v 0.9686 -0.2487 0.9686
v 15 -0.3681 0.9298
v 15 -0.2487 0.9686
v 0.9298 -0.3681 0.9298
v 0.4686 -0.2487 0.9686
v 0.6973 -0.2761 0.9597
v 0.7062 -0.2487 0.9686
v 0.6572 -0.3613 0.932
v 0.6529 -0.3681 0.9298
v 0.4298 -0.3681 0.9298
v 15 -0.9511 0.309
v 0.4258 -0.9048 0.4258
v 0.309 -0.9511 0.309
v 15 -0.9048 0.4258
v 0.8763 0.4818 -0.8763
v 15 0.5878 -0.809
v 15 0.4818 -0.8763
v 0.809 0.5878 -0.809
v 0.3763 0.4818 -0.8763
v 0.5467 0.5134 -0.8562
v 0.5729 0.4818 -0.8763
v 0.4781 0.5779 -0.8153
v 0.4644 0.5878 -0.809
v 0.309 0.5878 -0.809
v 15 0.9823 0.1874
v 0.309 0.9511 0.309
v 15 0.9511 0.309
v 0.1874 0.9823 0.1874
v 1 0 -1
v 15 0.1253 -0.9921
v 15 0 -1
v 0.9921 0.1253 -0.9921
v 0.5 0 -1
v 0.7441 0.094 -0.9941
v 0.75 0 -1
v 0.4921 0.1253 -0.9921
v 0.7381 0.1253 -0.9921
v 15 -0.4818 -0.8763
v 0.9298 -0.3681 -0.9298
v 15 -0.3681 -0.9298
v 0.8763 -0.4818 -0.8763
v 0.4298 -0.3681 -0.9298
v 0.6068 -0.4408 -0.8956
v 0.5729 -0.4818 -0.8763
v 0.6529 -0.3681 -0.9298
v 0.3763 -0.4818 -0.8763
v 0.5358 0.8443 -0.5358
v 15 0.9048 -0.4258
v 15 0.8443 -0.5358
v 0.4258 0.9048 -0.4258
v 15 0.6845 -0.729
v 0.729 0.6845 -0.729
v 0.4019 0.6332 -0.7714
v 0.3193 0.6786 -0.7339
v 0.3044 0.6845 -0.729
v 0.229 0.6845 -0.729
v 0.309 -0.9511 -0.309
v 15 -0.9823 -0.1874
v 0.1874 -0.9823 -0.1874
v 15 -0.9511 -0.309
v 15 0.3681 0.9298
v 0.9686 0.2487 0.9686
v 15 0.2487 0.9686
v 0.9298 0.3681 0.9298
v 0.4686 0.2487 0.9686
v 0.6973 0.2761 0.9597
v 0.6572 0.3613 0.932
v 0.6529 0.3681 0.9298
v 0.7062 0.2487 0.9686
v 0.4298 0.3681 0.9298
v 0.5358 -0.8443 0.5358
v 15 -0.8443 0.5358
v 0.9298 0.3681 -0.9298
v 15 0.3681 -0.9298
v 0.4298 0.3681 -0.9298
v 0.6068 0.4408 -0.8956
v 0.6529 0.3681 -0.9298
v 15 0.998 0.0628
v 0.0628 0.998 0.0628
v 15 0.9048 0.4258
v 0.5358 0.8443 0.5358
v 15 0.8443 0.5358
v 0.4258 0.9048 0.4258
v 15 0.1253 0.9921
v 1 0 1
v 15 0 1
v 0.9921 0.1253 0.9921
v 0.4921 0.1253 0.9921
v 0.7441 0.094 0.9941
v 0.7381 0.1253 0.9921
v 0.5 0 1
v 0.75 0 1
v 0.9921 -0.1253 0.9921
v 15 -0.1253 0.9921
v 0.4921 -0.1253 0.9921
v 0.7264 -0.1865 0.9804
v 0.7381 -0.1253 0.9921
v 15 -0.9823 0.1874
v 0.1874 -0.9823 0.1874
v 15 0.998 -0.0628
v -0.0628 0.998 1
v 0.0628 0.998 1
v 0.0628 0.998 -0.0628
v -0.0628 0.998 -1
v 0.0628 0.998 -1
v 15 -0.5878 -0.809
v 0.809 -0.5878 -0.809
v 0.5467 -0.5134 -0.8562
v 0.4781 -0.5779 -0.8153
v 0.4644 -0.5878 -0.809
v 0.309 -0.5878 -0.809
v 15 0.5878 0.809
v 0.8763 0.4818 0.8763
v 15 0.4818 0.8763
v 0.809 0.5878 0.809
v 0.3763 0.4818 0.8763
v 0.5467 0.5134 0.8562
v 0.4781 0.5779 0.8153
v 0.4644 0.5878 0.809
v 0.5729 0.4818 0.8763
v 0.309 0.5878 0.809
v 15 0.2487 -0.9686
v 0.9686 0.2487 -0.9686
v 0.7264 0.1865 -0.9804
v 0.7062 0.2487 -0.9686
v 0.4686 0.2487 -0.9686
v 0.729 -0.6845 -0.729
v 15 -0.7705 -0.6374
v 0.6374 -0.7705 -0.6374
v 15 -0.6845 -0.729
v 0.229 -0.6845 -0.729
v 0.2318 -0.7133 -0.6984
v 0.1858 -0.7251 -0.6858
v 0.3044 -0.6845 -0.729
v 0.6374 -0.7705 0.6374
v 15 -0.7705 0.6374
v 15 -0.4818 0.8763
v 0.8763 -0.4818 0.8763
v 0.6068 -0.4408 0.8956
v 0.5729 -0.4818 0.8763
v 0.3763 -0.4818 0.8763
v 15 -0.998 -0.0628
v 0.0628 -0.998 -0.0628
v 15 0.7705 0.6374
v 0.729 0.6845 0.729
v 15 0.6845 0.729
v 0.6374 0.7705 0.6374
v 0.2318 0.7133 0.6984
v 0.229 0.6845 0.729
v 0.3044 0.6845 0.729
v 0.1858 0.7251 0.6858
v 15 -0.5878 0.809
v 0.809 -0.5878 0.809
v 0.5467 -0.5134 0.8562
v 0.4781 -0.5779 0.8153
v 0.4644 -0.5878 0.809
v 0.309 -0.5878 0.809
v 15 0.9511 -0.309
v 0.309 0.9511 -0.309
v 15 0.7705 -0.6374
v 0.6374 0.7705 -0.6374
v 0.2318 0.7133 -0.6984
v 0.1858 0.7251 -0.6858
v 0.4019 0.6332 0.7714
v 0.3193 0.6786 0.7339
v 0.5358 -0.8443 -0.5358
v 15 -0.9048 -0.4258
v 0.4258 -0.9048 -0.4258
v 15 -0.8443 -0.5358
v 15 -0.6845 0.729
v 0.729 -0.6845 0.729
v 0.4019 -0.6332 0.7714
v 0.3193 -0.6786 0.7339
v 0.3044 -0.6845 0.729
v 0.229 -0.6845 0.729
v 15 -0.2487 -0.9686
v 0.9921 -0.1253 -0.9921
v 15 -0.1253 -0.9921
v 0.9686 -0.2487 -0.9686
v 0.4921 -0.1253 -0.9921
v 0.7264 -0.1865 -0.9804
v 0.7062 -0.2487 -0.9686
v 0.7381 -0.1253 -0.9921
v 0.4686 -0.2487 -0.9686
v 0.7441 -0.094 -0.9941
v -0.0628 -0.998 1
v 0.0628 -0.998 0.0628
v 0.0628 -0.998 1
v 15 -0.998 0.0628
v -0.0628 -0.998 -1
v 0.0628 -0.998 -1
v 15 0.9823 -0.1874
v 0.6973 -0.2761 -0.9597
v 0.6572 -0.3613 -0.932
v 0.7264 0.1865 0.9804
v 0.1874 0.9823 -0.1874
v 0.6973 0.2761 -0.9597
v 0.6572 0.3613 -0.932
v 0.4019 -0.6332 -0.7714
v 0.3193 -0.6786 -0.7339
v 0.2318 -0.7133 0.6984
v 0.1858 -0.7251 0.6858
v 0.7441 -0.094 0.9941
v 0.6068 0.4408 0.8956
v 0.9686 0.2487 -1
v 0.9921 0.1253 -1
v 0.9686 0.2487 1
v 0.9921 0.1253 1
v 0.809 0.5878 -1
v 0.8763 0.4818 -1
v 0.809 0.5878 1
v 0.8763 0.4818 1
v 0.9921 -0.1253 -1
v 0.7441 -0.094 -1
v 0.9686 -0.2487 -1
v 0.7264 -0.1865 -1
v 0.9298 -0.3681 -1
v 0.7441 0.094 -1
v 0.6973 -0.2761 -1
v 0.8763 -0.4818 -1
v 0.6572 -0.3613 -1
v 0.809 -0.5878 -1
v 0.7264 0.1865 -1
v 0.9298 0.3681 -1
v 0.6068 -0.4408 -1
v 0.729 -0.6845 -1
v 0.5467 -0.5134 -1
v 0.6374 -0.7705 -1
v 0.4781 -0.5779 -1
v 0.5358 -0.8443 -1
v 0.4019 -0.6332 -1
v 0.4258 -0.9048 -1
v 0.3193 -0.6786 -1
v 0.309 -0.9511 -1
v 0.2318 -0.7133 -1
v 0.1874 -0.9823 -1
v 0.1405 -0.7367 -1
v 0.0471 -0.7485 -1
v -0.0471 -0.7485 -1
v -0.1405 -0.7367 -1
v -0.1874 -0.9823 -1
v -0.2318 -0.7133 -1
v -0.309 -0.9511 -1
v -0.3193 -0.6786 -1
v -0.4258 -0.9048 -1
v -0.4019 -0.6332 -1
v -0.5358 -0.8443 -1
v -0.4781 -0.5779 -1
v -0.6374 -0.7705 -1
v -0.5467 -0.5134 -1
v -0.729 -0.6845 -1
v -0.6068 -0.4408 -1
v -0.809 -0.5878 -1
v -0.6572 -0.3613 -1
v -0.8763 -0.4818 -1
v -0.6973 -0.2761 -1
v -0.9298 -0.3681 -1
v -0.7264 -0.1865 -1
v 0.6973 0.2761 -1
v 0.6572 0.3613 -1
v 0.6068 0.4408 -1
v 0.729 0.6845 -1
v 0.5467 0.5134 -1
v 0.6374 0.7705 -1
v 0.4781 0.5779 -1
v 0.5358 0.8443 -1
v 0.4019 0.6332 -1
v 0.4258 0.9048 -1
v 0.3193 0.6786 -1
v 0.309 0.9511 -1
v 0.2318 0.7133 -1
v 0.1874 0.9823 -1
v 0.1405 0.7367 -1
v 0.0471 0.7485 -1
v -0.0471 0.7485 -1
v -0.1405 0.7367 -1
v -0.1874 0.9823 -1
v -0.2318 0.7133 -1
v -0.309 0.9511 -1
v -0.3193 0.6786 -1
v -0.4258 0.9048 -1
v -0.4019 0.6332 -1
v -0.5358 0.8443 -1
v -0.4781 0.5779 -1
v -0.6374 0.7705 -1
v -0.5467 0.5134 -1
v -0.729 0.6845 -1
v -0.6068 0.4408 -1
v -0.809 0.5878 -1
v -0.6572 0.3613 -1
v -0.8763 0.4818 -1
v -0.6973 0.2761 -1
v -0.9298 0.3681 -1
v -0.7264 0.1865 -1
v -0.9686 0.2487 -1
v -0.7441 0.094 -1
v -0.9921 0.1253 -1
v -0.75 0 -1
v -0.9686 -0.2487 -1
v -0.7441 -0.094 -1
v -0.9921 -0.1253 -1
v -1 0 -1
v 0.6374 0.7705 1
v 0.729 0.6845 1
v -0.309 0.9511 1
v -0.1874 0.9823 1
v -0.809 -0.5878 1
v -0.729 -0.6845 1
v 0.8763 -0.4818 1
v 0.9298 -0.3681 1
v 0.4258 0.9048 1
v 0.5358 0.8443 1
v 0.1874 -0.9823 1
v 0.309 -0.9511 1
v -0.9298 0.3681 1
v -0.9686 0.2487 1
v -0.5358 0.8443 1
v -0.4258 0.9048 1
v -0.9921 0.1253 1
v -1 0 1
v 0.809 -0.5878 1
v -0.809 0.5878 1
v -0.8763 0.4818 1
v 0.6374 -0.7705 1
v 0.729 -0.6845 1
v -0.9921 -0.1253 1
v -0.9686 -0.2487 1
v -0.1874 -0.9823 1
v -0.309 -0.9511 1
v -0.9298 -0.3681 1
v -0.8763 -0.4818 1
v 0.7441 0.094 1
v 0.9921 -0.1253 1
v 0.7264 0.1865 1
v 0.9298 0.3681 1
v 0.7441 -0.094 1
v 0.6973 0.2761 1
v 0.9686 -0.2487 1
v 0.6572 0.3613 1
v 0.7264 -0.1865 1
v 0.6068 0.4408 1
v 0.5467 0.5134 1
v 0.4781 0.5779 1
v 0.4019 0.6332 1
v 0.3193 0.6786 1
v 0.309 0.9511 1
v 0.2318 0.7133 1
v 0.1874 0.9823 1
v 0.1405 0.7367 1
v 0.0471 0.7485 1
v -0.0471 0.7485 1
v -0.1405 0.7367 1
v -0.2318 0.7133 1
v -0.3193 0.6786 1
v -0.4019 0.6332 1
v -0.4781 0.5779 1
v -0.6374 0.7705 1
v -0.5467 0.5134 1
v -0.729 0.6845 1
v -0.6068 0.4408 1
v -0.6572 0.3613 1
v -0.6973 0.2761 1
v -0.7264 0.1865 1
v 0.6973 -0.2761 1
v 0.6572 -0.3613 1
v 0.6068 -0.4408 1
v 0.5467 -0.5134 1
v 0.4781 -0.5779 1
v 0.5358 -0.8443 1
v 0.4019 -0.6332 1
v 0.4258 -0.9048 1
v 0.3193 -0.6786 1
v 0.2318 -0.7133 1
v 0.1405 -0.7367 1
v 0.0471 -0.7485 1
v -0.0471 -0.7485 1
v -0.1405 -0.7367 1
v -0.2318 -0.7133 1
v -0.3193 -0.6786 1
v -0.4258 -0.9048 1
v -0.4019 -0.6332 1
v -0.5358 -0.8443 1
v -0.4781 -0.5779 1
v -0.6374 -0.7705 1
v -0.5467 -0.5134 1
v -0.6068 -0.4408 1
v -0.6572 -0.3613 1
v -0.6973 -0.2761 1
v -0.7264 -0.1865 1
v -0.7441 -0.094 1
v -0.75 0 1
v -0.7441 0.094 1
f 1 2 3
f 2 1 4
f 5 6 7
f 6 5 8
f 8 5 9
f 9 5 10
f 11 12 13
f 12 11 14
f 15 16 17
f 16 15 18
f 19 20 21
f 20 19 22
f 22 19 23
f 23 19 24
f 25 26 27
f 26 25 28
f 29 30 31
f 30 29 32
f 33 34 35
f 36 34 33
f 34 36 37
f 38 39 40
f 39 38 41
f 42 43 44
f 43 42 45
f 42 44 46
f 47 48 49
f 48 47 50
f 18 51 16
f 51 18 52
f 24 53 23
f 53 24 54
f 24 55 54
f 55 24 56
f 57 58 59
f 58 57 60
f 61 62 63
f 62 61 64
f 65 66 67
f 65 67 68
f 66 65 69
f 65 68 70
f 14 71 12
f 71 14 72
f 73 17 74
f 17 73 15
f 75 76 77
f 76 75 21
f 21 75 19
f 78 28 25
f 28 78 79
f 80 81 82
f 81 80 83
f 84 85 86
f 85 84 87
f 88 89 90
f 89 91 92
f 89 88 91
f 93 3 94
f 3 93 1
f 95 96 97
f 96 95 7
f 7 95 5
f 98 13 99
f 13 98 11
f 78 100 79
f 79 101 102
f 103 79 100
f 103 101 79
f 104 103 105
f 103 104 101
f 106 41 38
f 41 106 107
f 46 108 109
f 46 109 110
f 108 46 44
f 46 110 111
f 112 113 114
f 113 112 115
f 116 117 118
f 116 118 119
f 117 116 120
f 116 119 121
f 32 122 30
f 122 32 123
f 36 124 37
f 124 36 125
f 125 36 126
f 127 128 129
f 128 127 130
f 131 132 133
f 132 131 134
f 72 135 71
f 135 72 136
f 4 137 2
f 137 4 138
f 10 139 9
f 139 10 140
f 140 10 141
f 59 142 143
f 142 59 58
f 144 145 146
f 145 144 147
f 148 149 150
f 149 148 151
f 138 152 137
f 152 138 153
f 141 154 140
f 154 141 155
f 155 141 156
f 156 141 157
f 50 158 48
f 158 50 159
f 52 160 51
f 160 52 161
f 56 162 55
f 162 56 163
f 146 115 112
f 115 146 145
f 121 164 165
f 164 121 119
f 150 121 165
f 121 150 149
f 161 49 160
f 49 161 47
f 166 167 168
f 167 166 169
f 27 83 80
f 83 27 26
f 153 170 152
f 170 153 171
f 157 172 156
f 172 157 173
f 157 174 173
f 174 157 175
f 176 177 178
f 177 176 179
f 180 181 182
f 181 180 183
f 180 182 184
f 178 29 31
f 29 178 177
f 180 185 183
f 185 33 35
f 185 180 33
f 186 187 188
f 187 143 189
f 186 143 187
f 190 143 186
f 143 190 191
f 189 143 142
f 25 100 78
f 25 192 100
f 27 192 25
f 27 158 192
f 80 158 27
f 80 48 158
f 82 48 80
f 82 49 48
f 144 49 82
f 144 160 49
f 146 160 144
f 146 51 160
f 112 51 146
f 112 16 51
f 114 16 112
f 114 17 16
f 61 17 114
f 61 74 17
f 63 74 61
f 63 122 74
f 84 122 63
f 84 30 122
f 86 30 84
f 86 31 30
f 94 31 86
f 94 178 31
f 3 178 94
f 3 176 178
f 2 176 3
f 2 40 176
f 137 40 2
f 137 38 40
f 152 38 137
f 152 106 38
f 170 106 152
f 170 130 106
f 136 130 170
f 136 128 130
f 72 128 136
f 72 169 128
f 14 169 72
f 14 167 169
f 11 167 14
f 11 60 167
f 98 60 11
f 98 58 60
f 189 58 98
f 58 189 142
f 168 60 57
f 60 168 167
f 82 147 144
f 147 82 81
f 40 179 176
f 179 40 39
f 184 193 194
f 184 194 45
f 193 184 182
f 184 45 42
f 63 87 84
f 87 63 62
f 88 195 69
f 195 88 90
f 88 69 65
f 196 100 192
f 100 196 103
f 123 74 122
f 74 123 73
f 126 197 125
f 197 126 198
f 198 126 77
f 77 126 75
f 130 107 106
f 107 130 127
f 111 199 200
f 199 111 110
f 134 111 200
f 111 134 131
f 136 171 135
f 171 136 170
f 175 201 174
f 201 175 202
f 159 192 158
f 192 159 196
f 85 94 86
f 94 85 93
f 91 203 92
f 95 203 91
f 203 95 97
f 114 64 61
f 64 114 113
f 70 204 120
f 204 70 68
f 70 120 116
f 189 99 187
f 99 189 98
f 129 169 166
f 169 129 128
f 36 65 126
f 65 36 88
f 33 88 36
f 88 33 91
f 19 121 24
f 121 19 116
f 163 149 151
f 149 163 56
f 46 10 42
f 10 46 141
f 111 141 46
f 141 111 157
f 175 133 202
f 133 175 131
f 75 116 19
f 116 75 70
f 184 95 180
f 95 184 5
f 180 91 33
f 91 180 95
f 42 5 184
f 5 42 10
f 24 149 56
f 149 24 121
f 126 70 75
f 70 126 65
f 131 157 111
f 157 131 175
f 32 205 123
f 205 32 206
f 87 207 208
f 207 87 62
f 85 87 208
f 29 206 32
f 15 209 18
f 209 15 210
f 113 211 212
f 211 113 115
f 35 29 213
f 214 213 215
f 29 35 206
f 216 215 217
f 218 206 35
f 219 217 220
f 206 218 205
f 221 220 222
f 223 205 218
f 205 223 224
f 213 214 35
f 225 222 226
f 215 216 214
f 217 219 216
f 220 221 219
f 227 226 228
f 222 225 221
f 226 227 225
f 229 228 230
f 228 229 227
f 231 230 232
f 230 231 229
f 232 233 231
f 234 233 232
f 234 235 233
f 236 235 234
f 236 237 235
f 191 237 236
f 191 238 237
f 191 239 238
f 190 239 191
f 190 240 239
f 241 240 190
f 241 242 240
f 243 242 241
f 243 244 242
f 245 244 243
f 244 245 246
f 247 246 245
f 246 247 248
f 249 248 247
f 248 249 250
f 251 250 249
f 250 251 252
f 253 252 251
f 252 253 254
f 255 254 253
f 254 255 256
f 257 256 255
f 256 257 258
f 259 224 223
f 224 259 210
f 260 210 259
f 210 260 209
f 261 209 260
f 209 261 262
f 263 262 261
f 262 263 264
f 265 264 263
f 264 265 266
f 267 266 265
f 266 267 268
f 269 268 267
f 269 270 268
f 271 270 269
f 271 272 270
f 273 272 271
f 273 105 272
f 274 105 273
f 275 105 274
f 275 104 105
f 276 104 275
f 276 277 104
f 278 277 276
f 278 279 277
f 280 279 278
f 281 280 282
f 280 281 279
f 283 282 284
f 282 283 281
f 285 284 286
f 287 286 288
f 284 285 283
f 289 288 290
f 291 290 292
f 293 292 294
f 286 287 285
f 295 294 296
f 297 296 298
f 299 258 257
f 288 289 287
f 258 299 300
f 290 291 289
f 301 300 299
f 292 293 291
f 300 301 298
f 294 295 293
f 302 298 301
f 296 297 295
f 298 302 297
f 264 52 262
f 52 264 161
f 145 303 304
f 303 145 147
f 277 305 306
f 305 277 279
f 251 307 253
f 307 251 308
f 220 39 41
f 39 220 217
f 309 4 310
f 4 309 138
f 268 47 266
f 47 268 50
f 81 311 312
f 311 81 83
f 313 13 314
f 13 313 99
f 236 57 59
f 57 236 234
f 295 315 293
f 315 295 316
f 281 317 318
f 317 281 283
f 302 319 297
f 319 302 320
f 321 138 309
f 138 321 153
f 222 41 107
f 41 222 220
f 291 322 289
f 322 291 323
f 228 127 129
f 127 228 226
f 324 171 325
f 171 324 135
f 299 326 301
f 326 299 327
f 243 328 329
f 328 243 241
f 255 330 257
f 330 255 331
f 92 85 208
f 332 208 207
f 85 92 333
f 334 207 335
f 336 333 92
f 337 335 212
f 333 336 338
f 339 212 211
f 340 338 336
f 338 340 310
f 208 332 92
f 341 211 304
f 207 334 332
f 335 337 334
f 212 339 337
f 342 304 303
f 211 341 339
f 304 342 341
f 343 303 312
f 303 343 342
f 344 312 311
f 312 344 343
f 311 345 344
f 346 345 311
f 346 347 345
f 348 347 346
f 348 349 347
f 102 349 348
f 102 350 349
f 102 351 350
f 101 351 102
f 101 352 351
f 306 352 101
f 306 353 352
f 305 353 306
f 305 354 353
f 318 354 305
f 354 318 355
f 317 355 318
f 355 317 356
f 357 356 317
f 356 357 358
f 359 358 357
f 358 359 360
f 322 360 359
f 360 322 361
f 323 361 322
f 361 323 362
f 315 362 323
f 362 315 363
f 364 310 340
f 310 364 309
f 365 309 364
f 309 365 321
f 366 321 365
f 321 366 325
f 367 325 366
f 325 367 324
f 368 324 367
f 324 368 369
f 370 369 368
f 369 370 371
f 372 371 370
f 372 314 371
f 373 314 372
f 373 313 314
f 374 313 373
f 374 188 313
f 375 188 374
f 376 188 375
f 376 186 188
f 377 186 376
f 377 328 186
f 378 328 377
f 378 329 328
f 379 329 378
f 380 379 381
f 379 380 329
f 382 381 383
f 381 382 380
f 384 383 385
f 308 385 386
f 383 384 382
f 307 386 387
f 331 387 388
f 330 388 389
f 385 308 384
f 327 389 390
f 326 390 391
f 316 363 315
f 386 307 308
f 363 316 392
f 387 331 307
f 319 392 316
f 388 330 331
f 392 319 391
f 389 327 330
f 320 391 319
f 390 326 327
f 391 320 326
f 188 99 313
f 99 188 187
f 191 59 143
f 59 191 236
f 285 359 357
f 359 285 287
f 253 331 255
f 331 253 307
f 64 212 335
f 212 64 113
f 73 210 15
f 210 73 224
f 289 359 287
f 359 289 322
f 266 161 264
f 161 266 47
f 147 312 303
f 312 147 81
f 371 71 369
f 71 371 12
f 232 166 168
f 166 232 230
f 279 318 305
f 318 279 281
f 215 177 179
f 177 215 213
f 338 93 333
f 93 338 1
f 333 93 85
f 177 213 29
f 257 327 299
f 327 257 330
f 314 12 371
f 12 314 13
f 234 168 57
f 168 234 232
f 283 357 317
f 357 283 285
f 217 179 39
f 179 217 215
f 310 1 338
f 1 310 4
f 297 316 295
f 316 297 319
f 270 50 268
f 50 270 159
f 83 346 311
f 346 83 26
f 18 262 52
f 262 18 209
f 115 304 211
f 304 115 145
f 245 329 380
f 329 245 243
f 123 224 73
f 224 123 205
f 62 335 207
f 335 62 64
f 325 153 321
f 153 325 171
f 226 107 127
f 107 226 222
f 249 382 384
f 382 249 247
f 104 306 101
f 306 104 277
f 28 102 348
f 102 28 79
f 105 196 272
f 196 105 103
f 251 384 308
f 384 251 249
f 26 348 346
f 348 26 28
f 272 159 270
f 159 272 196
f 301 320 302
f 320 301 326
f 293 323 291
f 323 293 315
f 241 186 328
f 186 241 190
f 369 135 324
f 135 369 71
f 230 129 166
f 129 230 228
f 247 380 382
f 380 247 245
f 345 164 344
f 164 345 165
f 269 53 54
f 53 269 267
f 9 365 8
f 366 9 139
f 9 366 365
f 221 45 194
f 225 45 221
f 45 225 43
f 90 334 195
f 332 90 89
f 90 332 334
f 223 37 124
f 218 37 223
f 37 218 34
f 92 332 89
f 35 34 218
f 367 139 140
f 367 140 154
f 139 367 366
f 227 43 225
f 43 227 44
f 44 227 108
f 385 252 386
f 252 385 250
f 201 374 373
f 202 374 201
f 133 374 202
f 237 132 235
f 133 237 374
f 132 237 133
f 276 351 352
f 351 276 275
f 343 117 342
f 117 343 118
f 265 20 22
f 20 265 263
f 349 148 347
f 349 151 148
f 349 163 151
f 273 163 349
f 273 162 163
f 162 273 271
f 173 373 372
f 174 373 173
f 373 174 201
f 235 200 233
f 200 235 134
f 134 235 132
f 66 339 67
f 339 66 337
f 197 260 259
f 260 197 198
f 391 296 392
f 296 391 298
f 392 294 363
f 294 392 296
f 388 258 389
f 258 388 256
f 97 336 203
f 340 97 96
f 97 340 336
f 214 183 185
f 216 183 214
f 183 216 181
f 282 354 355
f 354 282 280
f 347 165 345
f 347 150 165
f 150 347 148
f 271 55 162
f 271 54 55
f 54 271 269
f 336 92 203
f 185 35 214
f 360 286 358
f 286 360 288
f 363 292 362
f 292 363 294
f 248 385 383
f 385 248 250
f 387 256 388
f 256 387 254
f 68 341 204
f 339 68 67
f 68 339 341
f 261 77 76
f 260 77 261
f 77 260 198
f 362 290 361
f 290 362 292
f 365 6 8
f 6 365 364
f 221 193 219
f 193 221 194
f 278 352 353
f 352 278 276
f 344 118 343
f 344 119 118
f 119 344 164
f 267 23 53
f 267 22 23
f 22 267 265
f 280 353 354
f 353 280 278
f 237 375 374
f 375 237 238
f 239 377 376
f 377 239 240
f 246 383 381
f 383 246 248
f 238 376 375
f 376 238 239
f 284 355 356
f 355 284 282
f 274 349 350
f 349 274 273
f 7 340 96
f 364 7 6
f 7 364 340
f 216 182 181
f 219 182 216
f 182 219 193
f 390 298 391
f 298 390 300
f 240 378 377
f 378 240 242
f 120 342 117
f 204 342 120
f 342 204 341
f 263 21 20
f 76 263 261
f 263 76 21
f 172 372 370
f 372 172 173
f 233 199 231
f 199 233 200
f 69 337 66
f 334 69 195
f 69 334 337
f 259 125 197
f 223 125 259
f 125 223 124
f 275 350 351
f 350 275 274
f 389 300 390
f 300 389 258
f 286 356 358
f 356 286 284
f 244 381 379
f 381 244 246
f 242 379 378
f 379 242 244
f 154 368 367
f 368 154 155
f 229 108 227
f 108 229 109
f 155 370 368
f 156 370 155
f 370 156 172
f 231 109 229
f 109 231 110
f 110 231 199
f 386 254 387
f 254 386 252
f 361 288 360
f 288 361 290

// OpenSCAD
$fn = 50;
module pull_bar(bar_length = 15) {
  union() {
  // push bar
  difference() {
    rotate([0, 90, 0])
    cylinder(h = bar_length, r = 1);
    translate([-.5, 0, -1])
    cylinder(h = 2, r = 1);
    }

    // grabber
    translate([0, 0, -1])
    difference() {
      translate([0, 0,  0])
      cylinder(h = 2, r = 1);
      translate([0, 0,  -1])
      cylinder(h = 4, r = .75);
    }
  }
}
pull_bar();
